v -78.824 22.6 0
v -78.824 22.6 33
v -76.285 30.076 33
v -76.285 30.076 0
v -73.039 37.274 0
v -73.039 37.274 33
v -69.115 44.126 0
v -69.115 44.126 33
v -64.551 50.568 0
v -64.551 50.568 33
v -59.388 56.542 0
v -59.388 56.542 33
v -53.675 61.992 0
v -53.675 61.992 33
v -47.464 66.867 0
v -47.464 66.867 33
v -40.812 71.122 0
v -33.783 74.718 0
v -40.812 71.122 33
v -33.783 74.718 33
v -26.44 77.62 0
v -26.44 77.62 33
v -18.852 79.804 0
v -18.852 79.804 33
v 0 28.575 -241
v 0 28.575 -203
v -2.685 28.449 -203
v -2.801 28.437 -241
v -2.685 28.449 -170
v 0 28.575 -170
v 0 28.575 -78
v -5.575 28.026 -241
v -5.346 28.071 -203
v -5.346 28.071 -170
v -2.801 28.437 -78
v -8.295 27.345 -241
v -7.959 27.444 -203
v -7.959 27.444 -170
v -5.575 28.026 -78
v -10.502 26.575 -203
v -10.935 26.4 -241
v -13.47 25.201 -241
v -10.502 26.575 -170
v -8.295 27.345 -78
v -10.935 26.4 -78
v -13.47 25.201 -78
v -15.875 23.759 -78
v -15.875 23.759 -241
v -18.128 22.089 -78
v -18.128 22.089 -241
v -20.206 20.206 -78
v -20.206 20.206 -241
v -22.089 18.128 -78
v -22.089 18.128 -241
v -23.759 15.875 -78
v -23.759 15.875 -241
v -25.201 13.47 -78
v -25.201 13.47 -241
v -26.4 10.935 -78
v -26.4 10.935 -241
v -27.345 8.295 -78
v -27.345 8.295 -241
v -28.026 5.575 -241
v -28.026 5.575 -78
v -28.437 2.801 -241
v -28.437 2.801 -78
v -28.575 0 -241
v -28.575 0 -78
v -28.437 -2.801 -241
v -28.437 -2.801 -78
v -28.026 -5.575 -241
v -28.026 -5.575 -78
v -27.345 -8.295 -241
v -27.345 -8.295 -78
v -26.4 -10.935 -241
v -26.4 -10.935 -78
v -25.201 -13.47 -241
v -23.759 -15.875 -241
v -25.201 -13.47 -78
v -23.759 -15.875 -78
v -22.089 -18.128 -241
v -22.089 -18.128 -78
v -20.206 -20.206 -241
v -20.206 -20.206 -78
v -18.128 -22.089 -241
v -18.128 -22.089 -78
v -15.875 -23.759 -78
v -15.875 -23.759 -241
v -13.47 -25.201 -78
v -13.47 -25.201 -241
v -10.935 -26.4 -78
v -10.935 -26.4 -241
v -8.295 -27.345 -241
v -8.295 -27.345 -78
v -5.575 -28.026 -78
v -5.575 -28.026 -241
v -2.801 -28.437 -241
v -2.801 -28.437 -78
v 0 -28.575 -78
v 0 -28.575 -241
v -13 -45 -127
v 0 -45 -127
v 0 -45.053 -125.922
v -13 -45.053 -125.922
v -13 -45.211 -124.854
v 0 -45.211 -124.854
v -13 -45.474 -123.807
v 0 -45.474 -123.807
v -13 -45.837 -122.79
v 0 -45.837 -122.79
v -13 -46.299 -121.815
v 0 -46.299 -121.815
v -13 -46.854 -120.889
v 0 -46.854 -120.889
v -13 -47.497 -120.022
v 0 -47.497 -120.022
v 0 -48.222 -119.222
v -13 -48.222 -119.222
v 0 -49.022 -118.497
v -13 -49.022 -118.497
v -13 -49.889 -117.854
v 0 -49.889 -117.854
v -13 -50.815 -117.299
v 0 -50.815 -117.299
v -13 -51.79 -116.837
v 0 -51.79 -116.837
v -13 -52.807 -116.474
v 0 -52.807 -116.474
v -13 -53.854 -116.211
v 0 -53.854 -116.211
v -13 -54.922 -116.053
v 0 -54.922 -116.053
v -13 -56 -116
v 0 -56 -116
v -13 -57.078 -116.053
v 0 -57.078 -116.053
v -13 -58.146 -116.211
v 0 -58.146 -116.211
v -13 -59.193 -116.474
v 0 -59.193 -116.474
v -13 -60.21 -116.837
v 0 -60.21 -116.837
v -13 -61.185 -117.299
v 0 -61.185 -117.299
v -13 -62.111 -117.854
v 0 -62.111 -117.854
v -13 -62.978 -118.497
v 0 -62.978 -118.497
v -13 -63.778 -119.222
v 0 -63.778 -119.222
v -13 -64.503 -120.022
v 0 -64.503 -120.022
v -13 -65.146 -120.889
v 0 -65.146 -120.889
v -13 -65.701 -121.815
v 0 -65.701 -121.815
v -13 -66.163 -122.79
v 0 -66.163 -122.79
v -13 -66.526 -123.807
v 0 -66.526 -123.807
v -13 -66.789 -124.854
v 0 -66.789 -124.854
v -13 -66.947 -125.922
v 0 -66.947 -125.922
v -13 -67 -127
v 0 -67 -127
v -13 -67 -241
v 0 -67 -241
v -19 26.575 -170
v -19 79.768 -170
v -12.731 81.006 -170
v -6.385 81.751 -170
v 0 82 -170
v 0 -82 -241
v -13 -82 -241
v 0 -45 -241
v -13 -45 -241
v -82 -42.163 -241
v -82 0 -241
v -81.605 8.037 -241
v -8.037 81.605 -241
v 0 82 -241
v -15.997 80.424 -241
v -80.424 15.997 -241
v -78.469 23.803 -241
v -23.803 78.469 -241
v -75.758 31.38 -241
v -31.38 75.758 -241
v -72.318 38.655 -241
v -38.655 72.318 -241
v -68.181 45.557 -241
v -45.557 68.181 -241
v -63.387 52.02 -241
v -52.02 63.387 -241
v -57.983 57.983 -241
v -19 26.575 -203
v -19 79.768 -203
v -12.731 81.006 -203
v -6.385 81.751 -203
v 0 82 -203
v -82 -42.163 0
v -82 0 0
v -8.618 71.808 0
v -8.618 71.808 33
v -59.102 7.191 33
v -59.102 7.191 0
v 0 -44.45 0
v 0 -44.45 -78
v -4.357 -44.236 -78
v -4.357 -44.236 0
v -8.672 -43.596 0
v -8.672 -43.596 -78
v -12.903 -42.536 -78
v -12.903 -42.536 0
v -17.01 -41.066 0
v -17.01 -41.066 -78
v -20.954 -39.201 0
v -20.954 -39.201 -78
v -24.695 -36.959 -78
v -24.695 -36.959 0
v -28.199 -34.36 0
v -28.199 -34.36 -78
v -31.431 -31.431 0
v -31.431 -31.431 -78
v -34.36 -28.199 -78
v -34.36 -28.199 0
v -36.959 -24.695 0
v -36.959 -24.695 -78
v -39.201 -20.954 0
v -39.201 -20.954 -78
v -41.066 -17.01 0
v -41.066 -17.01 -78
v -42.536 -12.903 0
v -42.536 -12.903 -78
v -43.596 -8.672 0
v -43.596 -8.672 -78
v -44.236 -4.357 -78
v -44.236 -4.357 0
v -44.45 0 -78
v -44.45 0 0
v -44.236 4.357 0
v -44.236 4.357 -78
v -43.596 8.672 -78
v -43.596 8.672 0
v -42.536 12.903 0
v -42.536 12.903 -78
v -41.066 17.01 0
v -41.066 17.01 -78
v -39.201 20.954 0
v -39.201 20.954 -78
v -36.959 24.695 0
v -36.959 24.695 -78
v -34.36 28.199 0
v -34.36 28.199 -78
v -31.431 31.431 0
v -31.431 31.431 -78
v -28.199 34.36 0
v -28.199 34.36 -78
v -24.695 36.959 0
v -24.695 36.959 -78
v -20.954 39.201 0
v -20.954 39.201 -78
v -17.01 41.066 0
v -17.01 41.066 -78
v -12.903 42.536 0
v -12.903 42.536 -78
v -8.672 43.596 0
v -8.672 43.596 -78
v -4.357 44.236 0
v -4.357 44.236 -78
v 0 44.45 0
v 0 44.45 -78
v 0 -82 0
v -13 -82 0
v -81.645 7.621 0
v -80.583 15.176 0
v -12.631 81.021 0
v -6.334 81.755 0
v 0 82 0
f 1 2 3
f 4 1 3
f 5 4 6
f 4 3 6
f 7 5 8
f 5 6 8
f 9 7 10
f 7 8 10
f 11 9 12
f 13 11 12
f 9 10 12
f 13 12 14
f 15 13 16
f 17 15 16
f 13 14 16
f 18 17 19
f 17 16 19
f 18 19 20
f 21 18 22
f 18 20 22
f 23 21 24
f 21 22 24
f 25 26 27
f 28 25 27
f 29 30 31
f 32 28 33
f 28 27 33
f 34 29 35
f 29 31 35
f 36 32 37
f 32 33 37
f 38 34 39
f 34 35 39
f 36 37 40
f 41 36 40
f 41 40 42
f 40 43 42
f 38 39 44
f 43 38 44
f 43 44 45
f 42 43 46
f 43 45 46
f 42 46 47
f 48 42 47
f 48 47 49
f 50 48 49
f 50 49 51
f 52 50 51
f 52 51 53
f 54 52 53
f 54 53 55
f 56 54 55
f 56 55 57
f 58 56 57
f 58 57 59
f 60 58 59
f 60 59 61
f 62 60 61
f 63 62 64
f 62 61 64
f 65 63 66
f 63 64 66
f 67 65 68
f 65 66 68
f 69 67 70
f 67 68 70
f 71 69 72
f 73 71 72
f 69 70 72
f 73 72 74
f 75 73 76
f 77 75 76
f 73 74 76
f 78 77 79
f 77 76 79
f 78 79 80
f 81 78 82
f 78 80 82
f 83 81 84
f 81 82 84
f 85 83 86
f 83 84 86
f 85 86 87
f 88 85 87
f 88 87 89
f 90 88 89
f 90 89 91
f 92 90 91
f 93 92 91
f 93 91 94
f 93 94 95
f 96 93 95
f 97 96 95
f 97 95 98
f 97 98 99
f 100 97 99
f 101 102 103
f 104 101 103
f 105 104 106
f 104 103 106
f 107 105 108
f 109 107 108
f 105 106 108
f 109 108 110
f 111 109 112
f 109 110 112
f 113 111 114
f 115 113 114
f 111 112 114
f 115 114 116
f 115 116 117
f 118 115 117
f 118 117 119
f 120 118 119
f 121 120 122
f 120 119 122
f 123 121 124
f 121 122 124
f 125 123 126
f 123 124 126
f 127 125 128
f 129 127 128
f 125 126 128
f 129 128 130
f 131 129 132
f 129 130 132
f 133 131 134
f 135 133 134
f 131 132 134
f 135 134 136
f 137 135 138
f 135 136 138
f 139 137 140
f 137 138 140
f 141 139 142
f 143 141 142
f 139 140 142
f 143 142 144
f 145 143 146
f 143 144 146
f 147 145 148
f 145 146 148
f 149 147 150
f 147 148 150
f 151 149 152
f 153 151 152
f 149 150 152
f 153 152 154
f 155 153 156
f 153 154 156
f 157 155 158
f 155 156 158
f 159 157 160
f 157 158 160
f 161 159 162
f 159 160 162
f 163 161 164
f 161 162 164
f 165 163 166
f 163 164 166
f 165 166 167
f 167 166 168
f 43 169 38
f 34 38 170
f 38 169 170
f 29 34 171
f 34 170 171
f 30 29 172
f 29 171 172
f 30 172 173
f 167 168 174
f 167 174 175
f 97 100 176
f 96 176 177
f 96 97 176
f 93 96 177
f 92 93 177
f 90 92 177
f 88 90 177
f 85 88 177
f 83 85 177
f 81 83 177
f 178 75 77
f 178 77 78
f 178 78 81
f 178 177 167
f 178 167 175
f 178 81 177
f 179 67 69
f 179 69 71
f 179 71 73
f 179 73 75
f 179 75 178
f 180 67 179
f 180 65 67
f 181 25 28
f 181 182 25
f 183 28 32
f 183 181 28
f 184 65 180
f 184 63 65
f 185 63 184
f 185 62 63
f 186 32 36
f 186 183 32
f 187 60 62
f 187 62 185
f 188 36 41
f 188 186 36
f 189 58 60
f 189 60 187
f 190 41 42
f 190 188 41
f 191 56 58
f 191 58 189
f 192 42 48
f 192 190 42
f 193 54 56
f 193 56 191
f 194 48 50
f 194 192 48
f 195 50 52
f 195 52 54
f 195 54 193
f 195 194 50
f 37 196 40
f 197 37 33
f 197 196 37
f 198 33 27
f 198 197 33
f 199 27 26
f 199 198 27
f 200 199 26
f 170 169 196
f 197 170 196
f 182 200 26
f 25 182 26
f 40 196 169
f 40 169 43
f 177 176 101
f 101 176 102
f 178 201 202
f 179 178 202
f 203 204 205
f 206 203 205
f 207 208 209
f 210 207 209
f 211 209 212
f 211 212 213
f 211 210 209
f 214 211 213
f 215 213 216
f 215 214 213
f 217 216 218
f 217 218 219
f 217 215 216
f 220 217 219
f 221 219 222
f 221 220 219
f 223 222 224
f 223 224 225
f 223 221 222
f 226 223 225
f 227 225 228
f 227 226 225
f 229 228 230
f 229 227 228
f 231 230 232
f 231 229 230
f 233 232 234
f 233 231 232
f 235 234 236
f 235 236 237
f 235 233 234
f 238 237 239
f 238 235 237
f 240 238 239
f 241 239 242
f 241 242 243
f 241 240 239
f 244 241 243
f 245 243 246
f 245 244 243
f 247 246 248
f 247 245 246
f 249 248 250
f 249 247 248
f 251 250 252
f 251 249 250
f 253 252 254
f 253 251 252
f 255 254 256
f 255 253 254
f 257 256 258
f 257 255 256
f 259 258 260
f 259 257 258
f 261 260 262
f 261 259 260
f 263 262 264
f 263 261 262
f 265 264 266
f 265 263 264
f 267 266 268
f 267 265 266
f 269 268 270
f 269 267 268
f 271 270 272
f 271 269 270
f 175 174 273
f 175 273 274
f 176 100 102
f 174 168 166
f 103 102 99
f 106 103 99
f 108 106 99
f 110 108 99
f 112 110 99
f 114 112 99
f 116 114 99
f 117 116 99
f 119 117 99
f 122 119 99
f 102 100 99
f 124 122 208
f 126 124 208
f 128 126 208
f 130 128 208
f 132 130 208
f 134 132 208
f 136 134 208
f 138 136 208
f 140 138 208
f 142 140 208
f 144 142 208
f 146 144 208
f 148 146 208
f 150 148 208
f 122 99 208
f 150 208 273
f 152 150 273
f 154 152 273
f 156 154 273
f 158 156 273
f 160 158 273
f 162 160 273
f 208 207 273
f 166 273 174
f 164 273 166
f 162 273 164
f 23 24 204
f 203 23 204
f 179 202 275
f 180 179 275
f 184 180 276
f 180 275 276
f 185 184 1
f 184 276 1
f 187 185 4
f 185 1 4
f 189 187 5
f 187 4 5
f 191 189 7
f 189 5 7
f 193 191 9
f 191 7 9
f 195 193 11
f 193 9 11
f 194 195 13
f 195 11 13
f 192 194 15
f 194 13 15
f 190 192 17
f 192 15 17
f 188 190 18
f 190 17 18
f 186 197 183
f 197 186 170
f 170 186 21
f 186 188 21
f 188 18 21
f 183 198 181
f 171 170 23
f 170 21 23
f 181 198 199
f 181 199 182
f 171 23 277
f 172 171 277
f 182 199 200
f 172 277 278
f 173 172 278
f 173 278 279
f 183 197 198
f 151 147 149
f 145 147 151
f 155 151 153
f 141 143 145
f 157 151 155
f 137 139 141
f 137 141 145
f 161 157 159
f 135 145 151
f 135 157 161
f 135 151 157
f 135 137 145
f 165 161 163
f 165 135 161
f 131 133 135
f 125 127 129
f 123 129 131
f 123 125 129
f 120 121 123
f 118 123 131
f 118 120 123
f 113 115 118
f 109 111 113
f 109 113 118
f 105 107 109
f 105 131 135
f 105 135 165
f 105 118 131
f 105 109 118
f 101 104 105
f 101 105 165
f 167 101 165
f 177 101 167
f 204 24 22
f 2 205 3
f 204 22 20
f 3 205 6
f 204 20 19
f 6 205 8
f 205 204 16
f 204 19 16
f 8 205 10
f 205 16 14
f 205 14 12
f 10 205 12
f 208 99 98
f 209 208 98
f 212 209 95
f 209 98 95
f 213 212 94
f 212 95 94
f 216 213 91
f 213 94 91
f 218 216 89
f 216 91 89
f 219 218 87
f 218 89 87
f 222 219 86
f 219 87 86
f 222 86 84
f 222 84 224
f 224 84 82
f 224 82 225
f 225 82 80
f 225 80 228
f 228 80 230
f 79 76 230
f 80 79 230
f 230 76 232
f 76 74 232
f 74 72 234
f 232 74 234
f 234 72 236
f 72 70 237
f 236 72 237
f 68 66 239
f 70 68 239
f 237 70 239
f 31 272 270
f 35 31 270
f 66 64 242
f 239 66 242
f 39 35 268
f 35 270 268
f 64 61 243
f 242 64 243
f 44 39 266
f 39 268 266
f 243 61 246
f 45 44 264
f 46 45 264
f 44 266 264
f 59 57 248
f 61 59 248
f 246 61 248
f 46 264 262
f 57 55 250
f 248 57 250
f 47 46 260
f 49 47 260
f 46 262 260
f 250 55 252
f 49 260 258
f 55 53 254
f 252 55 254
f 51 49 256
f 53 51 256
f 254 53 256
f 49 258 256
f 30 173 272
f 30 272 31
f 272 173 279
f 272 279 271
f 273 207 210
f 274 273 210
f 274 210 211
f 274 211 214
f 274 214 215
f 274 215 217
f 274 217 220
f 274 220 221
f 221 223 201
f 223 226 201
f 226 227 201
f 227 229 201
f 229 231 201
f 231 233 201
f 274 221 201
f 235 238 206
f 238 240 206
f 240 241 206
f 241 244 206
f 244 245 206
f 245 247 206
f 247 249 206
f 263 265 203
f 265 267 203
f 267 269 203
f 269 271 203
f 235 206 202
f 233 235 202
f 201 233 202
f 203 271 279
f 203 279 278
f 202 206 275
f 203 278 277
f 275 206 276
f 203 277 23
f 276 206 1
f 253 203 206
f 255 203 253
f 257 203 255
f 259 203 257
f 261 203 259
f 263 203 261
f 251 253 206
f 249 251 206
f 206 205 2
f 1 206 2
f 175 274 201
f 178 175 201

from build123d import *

# Parameters (mm, degrees)
BOSS_EXTRUDE1_DEPTH = 241
CUT_EXTRUDE1_DEPTH  = 78
BOSS_EXTRUDE2_START = 33
BOSS_EXTRUDE2_DEPTH = 33
SKETCH5_W           = 33
SKETCH5_H           = 53.425
CUT_EXTRUDE2_DEPTH  = 19
SKETCH7_W           = 19
SKETCH7_H           = 33
CUT_EXTRUDE3_DEPTH  = 2
CUT_EXTRUDE4_DEPTH  = 13


with BuildPart() as part:
    # Sketch2 → Boss-Extrude1 (new body)
    with BuildSketch(Plane.XY):
        with BuildLine():
            Line((0, -28.575), (0, -82))
            Line((0, -82), (-13, -82))
            Line((-13, -82), (-82, -42.162831426))
            Line((-82, -42.162831426), (-82, 0))
            ThreePointArc((-82, 0), (-57.982756057, 57.982756057), (0, 82))
            Line((0, 82), (0, 28.575))
            ThreePointArc((0, 28.575), (-28.575, 0), (0, -28.575))
        make_face()
    extrude(amount=-BOSS_EXTRUDE1_DEPTH)

    # Sketch3 → Cut-Extrude1 (cut)
    with BuildSketch(Plane.XY):
        with BuildLine():
            Line((0, 44.45), (0, 28.575))
            ThreePointArc((0, 28.575), (-28.575, 0), (0, -28.575))
            Line((0, -28.575), (0, -44.45))
            ThreePointArc((0, -44.45), (-44.45, 0), (0, 44.45))
        make_face()
    extrude(amount=-CUT_EXTRUDE1_DEPTH, mode=Mode.SUBTRACT)

    # Sketch4 → Boss-Extrude2 (add)
    with BuildSketch(Plane.XY.offset(BOSS_EXTRUDE2_START)):
        with BuildLine():
            Line((-18.851828073, 79.803562441), (-8.61759969, 71.807706907))
            Line((-8.61759969, 71.807706907), (-59.101840666, 7.190825111))
            Line((-59.101840666, 7.190825111), (-78.824213609, 22.599631612))
            ThreePointArc((-78.824213609, 22.599631612), (-56.597037955, 59.336121332), (-18.851828073, 79.803562441))
        make_face()
    extrude(amount=-BOSS_EXTRUDE2_DEPTH)

    # Sketch5 → Cut-Extrude2 (cut)
    with BuildSketch(Plane(origin=(0, 0, 0), x_dir=(0, 0, -1), z_dir=(1, 0, 0))):
        with Locations((186.5, 55.2875)):
            Rectangle(SKETCH5_W, SKETCH5_H)
    extrude(amount=-CUT_EXTRUDE2_DEPTH, mode=Mode.SUBTRACT)

    # Sketch7 → Cut-Extrude3 (cut)
    with BuildSketch(Plane(origin=(0, 28.575, 0), x_dir=(1, 0, 0), z_dir=(0, 1, 0))):
        with Locations((-9.5, 186.5)):
            Rectangle(SKETCH7_W, SKETCH7_H)
    extrude(amount=-CUT_EXTRUDE3_DEPTH, mode=Mode.SUBTRACT)

    # Sketch8 → Cut-Extrude4 (cut)
    with BuildSketch(Plane(origin=(0, 0, 0), x_dir=(0, 0, -1), z_dir=(1, 0, 0))):
        with BuildLine():
            Line((241, -45), (127, -45))
            ThreePointArc((127, -45), (116, -56), (127, -67))
            Line((127, -67), (241, -67))
            Line((241, -67), (241, -45))
        make_face()
    extrude(amount=-CUT_EXTRUDE4_DEPTH, mode=Mode.SUBTRACT)


solid = part.part
